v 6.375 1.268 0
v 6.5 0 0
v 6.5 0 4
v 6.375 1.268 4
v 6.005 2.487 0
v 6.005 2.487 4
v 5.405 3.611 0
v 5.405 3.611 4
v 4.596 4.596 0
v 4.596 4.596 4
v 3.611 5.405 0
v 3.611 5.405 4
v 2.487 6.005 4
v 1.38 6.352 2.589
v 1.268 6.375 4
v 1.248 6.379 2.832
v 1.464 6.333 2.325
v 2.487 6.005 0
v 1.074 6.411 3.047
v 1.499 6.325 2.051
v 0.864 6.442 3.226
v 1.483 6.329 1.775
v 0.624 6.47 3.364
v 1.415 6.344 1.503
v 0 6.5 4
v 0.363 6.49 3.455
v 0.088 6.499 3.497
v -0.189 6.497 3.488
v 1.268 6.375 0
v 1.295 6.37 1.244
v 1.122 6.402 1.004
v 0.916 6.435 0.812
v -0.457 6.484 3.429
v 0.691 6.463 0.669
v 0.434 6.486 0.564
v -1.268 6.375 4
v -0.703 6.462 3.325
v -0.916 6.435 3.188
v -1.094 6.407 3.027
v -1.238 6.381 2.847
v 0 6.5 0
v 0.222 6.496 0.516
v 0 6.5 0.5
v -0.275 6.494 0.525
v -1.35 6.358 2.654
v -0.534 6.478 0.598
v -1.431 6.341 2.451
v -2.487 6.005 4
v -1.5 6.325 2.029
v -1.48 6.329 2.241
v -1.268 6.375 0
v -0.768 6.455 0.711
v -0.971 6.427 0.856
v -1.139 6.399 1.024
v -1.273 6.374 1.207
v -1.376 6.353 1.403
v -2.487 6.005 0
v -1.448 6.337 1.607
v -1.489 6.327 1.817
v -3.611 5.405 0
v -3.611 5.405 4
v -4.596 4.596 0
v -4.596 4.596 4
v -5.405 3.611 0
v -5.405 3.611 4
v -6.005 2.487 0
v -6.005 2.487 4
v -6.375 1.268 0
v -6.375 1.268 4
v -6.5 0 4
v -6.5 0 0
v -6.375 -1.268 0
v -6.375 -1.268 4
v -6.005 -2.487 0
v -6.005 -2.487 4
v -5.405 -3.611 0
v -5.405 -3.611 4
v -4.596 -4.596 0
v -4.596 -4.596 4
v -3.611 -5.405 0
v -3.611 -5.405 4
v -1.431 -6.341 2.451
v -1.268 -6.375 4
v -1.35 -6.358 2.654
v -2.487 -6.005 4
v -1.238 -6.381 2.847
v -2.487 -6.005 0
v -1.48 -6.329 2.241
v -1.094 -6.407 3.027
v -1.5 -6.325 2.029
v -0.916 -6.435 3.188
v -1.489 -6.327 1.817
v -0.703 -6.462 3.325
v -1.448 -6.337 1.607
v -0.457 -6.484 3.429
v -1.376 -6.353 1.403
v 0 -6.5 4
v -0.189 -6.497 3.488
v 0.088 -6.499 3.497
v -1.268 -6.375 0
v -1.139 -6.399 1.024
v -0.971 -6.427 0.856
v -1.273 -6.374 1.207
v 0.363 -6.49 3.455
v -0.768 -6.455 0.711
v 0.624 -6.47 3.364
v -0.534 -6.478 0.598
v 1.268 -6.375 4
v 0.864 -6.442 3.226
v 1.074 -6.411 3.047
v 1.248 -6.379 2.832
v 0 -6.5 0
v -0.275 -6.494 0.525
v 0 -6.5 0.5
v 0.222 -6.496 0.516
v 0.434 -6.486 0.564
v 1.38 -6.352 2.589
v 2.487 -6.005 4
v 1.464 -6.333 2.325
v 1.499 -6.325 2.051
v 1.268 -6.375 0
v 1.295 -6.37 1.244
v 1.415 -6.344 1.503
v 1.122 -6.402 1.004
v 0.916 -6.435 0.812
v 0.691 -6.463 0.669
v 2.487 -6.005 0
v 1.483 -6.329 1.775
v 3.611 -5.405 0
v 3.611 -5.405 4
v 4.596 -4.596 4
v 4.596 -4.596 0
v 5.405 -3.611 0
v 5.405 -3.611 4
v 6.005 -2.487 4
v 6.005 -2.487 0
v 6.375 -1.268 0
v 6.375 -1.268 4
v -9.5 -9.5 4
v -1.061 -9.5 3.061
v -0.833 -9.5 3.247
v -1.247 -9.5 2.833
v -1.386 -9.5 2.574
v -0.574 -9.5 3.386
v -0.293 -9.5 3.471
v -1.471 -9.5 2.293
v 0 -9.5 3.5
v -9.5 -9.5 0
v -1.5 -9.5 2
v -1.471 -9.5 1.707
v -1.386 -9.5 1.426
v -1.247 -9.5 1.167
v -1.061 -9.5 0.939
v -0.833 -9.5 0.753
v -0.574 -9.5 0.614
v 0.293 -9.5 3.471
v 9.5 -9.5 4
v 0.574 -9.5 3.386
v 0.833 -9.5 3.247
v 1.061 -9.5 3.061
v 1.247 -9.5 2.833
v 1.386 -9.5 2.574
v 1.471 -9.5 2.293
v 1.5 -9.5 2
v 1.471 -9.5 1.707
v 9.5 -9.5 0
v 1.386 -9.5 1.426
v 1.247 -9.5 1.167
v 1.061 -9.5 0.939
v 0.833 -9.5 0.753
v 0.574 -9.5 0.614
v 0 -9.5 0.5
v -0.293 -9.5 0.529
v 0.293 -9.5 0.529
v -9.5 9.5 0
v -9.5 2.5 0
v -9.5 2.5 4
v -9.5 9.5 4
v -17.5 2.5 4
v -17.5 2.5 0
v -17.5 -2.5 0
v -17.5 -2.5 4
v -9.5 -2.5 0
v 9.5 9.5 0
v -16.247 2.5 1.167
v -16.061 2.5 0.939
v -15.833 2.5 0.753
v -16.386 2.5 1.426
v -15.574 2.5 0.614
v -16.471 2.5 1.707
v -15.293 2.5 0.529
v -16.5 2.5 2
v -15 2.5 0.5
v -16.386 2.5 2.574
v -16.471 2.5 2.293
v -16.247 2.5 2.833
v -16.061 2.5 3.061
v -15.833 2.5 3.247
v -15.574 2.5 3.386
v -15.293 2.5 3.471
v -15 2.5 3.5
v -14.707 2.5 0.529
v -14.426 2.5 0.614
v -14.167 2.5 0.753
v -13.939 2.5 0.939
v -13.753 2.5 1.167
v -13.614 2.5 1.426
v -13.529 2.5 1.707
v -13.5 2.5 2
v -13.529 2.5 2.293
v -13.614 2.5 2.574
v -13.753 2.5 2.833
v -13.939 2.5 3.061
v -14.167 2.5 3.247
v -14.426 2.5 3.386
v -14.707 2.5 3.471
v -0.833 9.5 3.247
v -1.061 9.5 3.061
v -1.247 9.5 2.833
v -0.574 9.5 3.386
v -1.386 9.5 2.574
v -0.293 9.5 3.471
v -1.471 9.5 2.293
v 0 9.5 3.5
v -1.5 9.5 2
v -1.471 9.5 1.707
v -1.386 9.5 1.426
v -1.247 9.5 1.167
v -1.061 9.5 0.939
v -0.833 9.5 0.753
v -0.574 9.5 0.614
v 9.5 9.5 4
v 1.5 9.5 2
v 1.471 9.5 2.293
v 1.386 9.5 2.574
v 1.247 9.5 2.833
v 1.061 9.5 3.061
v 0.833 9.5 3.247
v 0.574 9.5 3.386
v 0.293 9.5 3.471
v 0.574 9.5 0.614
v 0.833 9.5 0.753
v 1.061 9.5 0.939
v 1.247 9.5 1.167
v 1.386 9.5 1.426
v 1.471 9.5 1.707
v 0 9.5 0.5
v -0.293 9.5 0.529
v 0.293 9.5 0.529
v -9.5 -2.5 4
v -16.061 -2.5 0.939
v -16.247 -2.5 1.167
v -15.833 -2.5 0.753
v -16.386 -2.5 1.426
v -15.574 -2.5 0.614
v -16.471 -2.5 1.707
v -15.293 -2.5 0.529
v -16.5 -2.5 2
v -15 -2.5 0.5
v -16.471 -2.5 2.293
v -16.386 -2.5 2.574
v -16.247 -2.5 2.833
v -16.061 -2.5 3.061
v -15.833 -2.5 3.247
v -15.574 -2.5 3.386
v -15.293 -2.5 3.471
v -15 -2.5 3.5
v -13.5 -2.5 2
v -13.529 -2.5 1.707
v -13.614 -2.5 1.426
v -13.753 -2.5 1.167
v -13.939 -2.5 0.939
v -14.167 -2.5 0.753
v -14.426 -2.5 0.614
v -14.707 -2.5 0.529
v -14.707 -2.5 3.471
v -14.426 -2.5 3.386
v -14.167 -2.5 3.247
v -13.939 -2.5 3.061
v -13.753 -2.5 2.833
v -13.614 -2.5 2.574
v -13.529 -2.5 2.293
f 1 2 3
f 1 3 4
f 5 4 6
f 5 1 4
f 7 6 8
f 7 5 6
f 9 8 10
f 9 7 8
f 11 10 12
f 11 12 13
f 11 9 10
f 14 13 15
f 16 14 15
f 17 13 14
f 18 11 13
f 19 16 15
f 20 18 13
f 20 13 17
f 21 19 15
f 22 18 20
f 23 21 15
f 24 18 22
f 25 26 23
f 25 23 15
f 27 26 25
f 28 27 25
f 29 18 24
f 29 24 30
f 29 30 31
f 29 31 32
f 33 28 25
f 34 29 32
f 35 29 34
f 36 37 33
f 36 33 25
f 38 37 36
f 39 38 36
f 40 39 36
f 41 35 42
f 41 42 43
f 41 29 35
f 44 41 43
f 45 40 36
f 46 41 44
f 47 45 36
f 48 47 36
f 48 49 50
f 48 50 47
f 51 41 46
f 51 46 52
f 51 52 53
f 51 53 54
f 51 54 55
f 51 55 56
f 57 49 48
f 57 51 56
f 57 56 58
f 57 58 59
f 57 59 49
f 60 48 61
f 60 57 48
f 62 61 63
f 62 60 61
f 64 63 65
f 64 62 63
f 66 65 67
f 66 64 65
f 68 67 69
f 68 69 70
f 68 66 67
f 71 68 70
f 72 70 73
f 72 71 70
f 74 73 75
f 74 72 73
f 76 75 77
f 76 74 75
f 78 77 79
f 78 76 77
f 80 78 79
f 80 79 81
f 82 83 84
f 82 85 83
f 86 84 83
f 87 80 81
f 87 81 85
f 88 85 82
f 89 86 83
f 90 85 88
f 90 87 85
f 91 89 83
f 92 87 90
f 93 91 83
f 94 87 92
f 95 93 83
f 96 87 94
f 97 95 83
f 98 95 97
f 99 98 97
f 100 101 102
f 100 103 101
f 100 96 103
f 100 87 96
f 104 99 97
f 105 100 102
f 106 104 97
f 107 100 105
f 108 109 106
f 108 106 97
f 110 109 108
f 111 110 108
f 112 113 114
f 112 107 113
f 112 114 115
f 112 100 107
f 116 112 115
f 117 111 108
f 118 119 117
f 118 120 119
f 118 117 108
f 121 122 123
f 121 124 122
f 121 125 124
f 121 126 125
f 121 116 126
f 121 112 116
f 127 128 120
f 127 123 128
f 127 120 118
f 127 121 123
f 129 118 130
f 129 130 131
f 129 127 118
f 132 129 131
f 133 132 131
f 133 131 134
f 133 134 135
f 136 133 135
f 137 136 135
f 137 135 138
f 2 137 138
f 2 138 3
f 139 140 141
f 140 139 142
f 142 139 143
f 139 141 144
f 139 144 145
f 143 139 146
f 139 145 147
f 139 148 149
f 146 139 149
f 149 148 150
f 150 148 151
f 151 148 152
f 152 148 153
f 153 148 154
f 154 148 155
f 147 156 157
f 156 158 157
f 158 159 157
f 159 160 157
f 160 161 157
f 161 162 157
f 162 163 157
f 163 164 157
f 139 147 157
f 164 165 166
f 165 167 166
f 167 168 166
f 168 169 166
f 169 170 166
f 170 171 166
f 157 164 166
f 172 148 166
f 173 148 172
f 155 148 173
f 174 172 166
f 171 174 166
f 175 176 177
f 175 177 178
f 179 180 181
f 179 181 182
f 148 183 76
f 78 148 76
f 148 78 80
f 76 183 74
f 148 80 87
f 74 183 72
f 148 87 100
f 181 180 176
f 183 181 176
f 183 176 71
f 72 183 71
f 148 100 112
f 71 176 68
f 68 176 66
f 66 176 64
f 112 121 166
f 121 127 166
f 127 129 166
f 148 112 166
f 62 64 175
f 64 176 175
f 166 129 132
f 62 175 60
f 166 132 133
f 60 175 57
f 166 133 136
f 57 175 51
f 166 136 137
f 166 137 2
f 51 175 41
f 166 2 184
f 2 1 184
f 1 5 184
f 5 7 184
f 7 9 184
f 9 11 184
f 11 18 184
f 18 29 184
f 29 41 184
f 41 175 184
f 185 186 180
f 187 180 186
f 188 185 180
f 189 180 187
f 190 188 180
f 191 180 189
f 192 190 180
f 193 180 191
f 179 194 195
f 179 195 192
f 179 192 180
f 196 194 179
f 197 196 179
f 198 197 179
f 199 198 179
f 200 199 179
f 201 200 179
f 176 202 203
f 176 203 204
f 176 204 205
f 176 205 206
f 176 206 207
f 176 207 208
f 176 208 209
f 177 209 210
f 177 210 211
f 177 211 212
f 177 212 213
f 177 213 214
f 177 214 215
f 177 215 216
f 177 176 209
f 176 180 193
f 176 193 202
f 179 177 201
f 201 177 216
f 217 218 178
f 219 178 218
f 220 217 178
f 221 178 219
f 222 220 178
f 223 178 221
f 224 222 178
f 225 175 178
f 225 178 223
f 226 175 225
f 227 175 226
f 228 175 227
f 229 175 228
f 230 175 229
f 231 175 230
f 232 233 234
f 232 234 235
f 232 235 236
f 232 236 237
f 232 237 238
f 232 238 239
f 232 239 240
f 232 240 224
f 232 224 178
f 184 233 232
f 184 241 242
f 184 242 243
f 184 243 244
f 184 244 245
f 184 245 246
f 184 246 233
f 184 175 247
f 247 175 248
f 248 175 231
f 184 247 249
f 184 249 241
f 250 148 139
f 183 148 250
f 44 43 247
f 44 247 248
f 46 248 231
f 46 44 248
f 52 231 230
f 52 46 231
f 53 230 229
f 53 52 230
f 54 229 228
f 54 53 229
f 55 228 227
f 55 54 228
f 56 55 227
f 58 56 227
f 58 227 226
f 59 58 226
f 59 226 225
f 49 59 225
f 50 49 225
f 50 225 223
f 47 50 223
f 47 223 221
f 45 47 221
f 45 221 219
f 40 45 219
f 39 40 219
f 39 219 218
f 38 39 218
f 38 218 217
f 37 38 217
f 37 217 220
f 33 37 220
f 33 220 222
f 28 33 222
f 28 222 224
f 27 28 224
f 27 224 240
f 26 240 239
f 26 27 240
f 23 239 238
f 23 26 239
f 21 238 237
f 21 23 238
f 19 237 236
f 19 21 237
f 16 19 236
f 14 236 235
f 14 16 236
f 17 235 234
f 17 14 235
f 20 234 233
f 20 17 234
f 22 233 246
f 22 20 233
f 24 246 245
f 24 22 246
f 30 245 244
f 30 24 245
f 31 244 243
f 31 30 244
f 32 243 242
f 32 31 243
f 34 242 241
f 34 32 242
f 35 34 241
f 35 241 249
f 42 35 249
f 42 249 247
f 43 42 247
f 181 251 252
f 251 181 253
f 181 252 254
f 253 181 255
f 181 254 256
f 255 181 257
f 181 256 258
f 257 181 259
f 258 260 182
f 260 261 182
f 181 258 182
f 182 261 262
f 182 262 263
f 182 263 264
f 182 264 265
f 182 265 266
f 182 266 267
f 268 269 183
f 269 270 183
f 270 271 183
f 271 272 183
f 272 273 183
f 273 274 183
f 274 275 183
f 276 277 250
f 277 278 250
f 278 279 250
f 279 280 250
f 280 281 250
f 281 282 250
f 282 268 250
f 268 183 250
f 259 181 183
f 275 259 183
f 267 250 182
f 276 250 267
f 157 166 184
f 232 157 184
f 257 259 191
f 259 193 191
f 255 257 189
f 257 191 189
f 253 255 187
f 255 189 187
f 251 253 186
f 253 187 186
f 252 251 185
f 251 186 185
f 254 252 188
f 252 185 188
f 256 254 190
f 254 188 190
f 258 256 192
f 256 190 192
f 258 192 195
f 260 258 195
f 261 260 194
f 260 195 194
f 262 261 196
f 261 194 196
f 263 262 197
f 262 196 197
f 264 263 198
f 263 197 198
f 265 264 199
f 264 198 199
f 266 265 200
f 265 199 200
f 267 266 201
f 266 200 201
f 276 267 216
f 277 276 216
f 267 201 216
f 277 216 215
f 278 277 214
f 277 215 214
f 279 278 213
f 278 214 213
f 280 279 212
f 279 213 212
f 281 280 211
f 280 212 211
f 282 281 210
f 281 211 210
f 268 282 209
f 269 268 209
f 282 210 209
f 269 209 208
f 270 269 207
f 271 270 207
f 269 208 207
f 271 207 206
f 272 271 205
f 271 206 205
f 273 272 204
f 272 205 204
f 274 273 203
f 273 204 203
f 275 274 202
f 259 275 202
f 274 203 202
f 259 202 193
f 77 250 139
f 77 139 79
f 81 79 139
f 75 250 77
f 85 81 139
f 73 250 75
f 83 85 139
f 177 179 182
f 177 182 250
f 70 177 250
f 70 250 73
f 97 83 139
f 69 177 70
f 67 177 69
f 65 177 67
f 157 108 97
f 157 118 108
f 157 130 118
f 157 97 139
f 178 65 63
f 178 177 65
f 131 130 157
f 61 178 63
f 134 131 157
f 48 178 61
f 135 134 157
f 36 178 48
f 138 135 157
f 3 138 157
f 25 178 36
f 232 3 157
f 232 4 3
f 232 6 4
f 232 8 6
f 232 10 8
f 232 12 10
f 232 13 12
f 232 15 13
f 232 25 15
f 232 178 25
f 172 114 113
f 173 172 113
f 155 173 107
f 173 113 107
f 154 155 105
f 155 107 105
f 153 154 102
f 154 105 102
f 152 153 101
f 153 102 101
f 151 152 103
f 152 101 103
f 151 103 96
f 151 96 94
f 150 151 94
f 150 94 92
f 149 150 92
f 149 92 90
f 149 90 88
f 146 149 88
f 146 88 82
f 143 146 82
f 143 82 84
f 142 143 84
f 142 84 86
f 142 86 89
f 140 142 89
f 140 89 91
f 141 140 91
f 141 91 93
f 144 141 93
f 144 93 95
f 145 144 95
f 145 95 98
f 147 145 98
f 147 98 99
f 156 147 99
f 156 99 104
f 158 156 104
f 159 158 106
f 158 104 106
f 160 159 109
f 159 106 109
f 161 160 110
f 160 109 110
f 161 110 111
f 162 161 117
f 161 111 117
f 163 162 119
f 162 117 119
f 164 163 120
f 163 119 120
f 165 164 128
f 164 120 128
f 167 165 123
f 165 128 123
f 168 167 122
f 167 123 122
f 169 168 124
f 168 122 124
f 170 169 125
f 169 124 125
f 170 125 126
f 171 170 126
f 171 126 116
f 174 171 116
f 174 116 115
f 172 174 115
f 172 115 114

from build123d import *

# Parameters (mm, degrees)
SKETCH1_W                      = 19
SKETCH1_H                      = 19
SKETCH1_R                      = 6.5
BOSS_EXTRUDE1_DEPTH            = 4
CUT_EXTRUDE1_REACH             = 16.018
SKETCH2_R                      = 1.5
CUT_EXTRUDE1_DIRECTION_2_REACH = 16.018
SKETCH5_W                      = 4
SKETCH5_H                      = 5
BOSS_EXTRUDE3_DEPTH            = 8
CUT_EXTRUDE2_REACH             = 22.31
SKETCH7_R                      = 1.5
CUT_EXTRUDE2_DIRECTION_2_REACH = 22.31


with BuildPart() as part:
    # Sketch1 → Boss-Extrude1 (new body)
    with BuildSketch(Plane.XY):
        Rectangle(SKETCH1_W, SKETCH1_H)
        Circle(SKETCH1_R, mode=Mode.SUBTRACT)
    extrude(amount=BOSS_EXTRUDE1_DEPTH)

    # Sketch2 → Cut-Extrude1 (cut, up to next)
    with BuildSketch(Plane(origin=(0, 0, 0), x_dir=(1, 0, 0), z_dir=(0, 1, 0)), mode=Mode.PRIVATE) as cut_extrude1_sk1:
        with Locations(Location((0, -2, 0), (0, 0, 90))):
            Circle(SKETCH2_R)
    cut_extrude1_tool1 = extrude(cut_extrude1_sk1.sketch, amount=CUT_EXTRUDE1_REACH, mode=Mode.PRIVATE) & part.part
    add(cut_extrude1_tool1.solids().sort_by_distance((0, 0, 2))[0], mode=Mode.SUBTRACT)

    # Sketch2 → Cut-Extrude1 direction 2 (cut, up to next)
    with BuildSketch(Plane(origin=(0, 0, 0), x_dir=(1, 0, 0), z_dir=(0, 1, 0)), mode=Mode.PRIVATE) as cut_extrude1_direction_2_sk1:
        with Locations(Location((0, -2, 0), (0, 0, 90))):
            Circle(SKETCH2_R)
    cut_extrude1_direction_2_tool1 = extrude(cut_extrude1_direction_2_sk1.sketch, amount=-CUT_EXTRUDE1_DIRECTION_2_REACH, mode=Mode.PRIVATE) & part.part
    add(cut_extrude1_direction_2_tool1.solids().sort_by_distance((0, 0, 2))[0], mode=Mode.SUBTRACT)

    # Sketch5 → Boss-Extrude3 (add)
    with BuildSketch(Plane.ZY.offset(9.5)):
        with Locations((2, 0)):
            Rectangle(SKETCH5_W, SKETCH5_H)
    extrude(amount=BOSS_EXTRUDE3_DEPTH)

    # Sketch7 → Cut-Extrude2 (cut, up to next)
    with BuildSketch(Plane(origin=(0, 0, 0), x_dir=(1, 0, 0), z_dir=(0, 1, 0)), mode=Mode.PRIVATE) as cut_extrude2_sk1:
        with Locations(Location((-15, -2, 0), (0, 0, 90))):
            Circle(SKETCH7_R)
    cut_extrude2_tool1 = extrude(cut_extrude2_sk1.sketch, amount=-CUT_EXTRUDE2_REACH, mode=Mode.PRIVATE) & part.part
    add(cut_extrude2_tool1.solids().sort_by_distance((-15, 0, 2))[0], mode=Mode.SUBTRACT)

    # Sketch7 → Cut-Extrude2 direction 2 (cut, up to next)
    with BuildSketch(Plane(origin=(0, 0, 0), x_dir=(1, 0, 0), z_dir=(0, 1, 0)), mode=Mode.PRIVATE) as cut_extrude2_direction_2_sk1:
        with Locations(Location((-15, -2, 0), (0, 0, 90))):
            Circle(SKETCH7_R)
    cut_extrude2_direction_2_tool1 = extrude(cut_extrude2_direction_2_sk1.sketch, amount=CUT_EXTRUDE2_DIRECTION_2_REACH, mode=Mode.PRIVATE) & part.part
    add(cut_extrude2_direction_2_tool1.solids().sort_by_distance((-15, 0, 2))[0], mode=Mode.SUBTRACT)


solid = part.part
